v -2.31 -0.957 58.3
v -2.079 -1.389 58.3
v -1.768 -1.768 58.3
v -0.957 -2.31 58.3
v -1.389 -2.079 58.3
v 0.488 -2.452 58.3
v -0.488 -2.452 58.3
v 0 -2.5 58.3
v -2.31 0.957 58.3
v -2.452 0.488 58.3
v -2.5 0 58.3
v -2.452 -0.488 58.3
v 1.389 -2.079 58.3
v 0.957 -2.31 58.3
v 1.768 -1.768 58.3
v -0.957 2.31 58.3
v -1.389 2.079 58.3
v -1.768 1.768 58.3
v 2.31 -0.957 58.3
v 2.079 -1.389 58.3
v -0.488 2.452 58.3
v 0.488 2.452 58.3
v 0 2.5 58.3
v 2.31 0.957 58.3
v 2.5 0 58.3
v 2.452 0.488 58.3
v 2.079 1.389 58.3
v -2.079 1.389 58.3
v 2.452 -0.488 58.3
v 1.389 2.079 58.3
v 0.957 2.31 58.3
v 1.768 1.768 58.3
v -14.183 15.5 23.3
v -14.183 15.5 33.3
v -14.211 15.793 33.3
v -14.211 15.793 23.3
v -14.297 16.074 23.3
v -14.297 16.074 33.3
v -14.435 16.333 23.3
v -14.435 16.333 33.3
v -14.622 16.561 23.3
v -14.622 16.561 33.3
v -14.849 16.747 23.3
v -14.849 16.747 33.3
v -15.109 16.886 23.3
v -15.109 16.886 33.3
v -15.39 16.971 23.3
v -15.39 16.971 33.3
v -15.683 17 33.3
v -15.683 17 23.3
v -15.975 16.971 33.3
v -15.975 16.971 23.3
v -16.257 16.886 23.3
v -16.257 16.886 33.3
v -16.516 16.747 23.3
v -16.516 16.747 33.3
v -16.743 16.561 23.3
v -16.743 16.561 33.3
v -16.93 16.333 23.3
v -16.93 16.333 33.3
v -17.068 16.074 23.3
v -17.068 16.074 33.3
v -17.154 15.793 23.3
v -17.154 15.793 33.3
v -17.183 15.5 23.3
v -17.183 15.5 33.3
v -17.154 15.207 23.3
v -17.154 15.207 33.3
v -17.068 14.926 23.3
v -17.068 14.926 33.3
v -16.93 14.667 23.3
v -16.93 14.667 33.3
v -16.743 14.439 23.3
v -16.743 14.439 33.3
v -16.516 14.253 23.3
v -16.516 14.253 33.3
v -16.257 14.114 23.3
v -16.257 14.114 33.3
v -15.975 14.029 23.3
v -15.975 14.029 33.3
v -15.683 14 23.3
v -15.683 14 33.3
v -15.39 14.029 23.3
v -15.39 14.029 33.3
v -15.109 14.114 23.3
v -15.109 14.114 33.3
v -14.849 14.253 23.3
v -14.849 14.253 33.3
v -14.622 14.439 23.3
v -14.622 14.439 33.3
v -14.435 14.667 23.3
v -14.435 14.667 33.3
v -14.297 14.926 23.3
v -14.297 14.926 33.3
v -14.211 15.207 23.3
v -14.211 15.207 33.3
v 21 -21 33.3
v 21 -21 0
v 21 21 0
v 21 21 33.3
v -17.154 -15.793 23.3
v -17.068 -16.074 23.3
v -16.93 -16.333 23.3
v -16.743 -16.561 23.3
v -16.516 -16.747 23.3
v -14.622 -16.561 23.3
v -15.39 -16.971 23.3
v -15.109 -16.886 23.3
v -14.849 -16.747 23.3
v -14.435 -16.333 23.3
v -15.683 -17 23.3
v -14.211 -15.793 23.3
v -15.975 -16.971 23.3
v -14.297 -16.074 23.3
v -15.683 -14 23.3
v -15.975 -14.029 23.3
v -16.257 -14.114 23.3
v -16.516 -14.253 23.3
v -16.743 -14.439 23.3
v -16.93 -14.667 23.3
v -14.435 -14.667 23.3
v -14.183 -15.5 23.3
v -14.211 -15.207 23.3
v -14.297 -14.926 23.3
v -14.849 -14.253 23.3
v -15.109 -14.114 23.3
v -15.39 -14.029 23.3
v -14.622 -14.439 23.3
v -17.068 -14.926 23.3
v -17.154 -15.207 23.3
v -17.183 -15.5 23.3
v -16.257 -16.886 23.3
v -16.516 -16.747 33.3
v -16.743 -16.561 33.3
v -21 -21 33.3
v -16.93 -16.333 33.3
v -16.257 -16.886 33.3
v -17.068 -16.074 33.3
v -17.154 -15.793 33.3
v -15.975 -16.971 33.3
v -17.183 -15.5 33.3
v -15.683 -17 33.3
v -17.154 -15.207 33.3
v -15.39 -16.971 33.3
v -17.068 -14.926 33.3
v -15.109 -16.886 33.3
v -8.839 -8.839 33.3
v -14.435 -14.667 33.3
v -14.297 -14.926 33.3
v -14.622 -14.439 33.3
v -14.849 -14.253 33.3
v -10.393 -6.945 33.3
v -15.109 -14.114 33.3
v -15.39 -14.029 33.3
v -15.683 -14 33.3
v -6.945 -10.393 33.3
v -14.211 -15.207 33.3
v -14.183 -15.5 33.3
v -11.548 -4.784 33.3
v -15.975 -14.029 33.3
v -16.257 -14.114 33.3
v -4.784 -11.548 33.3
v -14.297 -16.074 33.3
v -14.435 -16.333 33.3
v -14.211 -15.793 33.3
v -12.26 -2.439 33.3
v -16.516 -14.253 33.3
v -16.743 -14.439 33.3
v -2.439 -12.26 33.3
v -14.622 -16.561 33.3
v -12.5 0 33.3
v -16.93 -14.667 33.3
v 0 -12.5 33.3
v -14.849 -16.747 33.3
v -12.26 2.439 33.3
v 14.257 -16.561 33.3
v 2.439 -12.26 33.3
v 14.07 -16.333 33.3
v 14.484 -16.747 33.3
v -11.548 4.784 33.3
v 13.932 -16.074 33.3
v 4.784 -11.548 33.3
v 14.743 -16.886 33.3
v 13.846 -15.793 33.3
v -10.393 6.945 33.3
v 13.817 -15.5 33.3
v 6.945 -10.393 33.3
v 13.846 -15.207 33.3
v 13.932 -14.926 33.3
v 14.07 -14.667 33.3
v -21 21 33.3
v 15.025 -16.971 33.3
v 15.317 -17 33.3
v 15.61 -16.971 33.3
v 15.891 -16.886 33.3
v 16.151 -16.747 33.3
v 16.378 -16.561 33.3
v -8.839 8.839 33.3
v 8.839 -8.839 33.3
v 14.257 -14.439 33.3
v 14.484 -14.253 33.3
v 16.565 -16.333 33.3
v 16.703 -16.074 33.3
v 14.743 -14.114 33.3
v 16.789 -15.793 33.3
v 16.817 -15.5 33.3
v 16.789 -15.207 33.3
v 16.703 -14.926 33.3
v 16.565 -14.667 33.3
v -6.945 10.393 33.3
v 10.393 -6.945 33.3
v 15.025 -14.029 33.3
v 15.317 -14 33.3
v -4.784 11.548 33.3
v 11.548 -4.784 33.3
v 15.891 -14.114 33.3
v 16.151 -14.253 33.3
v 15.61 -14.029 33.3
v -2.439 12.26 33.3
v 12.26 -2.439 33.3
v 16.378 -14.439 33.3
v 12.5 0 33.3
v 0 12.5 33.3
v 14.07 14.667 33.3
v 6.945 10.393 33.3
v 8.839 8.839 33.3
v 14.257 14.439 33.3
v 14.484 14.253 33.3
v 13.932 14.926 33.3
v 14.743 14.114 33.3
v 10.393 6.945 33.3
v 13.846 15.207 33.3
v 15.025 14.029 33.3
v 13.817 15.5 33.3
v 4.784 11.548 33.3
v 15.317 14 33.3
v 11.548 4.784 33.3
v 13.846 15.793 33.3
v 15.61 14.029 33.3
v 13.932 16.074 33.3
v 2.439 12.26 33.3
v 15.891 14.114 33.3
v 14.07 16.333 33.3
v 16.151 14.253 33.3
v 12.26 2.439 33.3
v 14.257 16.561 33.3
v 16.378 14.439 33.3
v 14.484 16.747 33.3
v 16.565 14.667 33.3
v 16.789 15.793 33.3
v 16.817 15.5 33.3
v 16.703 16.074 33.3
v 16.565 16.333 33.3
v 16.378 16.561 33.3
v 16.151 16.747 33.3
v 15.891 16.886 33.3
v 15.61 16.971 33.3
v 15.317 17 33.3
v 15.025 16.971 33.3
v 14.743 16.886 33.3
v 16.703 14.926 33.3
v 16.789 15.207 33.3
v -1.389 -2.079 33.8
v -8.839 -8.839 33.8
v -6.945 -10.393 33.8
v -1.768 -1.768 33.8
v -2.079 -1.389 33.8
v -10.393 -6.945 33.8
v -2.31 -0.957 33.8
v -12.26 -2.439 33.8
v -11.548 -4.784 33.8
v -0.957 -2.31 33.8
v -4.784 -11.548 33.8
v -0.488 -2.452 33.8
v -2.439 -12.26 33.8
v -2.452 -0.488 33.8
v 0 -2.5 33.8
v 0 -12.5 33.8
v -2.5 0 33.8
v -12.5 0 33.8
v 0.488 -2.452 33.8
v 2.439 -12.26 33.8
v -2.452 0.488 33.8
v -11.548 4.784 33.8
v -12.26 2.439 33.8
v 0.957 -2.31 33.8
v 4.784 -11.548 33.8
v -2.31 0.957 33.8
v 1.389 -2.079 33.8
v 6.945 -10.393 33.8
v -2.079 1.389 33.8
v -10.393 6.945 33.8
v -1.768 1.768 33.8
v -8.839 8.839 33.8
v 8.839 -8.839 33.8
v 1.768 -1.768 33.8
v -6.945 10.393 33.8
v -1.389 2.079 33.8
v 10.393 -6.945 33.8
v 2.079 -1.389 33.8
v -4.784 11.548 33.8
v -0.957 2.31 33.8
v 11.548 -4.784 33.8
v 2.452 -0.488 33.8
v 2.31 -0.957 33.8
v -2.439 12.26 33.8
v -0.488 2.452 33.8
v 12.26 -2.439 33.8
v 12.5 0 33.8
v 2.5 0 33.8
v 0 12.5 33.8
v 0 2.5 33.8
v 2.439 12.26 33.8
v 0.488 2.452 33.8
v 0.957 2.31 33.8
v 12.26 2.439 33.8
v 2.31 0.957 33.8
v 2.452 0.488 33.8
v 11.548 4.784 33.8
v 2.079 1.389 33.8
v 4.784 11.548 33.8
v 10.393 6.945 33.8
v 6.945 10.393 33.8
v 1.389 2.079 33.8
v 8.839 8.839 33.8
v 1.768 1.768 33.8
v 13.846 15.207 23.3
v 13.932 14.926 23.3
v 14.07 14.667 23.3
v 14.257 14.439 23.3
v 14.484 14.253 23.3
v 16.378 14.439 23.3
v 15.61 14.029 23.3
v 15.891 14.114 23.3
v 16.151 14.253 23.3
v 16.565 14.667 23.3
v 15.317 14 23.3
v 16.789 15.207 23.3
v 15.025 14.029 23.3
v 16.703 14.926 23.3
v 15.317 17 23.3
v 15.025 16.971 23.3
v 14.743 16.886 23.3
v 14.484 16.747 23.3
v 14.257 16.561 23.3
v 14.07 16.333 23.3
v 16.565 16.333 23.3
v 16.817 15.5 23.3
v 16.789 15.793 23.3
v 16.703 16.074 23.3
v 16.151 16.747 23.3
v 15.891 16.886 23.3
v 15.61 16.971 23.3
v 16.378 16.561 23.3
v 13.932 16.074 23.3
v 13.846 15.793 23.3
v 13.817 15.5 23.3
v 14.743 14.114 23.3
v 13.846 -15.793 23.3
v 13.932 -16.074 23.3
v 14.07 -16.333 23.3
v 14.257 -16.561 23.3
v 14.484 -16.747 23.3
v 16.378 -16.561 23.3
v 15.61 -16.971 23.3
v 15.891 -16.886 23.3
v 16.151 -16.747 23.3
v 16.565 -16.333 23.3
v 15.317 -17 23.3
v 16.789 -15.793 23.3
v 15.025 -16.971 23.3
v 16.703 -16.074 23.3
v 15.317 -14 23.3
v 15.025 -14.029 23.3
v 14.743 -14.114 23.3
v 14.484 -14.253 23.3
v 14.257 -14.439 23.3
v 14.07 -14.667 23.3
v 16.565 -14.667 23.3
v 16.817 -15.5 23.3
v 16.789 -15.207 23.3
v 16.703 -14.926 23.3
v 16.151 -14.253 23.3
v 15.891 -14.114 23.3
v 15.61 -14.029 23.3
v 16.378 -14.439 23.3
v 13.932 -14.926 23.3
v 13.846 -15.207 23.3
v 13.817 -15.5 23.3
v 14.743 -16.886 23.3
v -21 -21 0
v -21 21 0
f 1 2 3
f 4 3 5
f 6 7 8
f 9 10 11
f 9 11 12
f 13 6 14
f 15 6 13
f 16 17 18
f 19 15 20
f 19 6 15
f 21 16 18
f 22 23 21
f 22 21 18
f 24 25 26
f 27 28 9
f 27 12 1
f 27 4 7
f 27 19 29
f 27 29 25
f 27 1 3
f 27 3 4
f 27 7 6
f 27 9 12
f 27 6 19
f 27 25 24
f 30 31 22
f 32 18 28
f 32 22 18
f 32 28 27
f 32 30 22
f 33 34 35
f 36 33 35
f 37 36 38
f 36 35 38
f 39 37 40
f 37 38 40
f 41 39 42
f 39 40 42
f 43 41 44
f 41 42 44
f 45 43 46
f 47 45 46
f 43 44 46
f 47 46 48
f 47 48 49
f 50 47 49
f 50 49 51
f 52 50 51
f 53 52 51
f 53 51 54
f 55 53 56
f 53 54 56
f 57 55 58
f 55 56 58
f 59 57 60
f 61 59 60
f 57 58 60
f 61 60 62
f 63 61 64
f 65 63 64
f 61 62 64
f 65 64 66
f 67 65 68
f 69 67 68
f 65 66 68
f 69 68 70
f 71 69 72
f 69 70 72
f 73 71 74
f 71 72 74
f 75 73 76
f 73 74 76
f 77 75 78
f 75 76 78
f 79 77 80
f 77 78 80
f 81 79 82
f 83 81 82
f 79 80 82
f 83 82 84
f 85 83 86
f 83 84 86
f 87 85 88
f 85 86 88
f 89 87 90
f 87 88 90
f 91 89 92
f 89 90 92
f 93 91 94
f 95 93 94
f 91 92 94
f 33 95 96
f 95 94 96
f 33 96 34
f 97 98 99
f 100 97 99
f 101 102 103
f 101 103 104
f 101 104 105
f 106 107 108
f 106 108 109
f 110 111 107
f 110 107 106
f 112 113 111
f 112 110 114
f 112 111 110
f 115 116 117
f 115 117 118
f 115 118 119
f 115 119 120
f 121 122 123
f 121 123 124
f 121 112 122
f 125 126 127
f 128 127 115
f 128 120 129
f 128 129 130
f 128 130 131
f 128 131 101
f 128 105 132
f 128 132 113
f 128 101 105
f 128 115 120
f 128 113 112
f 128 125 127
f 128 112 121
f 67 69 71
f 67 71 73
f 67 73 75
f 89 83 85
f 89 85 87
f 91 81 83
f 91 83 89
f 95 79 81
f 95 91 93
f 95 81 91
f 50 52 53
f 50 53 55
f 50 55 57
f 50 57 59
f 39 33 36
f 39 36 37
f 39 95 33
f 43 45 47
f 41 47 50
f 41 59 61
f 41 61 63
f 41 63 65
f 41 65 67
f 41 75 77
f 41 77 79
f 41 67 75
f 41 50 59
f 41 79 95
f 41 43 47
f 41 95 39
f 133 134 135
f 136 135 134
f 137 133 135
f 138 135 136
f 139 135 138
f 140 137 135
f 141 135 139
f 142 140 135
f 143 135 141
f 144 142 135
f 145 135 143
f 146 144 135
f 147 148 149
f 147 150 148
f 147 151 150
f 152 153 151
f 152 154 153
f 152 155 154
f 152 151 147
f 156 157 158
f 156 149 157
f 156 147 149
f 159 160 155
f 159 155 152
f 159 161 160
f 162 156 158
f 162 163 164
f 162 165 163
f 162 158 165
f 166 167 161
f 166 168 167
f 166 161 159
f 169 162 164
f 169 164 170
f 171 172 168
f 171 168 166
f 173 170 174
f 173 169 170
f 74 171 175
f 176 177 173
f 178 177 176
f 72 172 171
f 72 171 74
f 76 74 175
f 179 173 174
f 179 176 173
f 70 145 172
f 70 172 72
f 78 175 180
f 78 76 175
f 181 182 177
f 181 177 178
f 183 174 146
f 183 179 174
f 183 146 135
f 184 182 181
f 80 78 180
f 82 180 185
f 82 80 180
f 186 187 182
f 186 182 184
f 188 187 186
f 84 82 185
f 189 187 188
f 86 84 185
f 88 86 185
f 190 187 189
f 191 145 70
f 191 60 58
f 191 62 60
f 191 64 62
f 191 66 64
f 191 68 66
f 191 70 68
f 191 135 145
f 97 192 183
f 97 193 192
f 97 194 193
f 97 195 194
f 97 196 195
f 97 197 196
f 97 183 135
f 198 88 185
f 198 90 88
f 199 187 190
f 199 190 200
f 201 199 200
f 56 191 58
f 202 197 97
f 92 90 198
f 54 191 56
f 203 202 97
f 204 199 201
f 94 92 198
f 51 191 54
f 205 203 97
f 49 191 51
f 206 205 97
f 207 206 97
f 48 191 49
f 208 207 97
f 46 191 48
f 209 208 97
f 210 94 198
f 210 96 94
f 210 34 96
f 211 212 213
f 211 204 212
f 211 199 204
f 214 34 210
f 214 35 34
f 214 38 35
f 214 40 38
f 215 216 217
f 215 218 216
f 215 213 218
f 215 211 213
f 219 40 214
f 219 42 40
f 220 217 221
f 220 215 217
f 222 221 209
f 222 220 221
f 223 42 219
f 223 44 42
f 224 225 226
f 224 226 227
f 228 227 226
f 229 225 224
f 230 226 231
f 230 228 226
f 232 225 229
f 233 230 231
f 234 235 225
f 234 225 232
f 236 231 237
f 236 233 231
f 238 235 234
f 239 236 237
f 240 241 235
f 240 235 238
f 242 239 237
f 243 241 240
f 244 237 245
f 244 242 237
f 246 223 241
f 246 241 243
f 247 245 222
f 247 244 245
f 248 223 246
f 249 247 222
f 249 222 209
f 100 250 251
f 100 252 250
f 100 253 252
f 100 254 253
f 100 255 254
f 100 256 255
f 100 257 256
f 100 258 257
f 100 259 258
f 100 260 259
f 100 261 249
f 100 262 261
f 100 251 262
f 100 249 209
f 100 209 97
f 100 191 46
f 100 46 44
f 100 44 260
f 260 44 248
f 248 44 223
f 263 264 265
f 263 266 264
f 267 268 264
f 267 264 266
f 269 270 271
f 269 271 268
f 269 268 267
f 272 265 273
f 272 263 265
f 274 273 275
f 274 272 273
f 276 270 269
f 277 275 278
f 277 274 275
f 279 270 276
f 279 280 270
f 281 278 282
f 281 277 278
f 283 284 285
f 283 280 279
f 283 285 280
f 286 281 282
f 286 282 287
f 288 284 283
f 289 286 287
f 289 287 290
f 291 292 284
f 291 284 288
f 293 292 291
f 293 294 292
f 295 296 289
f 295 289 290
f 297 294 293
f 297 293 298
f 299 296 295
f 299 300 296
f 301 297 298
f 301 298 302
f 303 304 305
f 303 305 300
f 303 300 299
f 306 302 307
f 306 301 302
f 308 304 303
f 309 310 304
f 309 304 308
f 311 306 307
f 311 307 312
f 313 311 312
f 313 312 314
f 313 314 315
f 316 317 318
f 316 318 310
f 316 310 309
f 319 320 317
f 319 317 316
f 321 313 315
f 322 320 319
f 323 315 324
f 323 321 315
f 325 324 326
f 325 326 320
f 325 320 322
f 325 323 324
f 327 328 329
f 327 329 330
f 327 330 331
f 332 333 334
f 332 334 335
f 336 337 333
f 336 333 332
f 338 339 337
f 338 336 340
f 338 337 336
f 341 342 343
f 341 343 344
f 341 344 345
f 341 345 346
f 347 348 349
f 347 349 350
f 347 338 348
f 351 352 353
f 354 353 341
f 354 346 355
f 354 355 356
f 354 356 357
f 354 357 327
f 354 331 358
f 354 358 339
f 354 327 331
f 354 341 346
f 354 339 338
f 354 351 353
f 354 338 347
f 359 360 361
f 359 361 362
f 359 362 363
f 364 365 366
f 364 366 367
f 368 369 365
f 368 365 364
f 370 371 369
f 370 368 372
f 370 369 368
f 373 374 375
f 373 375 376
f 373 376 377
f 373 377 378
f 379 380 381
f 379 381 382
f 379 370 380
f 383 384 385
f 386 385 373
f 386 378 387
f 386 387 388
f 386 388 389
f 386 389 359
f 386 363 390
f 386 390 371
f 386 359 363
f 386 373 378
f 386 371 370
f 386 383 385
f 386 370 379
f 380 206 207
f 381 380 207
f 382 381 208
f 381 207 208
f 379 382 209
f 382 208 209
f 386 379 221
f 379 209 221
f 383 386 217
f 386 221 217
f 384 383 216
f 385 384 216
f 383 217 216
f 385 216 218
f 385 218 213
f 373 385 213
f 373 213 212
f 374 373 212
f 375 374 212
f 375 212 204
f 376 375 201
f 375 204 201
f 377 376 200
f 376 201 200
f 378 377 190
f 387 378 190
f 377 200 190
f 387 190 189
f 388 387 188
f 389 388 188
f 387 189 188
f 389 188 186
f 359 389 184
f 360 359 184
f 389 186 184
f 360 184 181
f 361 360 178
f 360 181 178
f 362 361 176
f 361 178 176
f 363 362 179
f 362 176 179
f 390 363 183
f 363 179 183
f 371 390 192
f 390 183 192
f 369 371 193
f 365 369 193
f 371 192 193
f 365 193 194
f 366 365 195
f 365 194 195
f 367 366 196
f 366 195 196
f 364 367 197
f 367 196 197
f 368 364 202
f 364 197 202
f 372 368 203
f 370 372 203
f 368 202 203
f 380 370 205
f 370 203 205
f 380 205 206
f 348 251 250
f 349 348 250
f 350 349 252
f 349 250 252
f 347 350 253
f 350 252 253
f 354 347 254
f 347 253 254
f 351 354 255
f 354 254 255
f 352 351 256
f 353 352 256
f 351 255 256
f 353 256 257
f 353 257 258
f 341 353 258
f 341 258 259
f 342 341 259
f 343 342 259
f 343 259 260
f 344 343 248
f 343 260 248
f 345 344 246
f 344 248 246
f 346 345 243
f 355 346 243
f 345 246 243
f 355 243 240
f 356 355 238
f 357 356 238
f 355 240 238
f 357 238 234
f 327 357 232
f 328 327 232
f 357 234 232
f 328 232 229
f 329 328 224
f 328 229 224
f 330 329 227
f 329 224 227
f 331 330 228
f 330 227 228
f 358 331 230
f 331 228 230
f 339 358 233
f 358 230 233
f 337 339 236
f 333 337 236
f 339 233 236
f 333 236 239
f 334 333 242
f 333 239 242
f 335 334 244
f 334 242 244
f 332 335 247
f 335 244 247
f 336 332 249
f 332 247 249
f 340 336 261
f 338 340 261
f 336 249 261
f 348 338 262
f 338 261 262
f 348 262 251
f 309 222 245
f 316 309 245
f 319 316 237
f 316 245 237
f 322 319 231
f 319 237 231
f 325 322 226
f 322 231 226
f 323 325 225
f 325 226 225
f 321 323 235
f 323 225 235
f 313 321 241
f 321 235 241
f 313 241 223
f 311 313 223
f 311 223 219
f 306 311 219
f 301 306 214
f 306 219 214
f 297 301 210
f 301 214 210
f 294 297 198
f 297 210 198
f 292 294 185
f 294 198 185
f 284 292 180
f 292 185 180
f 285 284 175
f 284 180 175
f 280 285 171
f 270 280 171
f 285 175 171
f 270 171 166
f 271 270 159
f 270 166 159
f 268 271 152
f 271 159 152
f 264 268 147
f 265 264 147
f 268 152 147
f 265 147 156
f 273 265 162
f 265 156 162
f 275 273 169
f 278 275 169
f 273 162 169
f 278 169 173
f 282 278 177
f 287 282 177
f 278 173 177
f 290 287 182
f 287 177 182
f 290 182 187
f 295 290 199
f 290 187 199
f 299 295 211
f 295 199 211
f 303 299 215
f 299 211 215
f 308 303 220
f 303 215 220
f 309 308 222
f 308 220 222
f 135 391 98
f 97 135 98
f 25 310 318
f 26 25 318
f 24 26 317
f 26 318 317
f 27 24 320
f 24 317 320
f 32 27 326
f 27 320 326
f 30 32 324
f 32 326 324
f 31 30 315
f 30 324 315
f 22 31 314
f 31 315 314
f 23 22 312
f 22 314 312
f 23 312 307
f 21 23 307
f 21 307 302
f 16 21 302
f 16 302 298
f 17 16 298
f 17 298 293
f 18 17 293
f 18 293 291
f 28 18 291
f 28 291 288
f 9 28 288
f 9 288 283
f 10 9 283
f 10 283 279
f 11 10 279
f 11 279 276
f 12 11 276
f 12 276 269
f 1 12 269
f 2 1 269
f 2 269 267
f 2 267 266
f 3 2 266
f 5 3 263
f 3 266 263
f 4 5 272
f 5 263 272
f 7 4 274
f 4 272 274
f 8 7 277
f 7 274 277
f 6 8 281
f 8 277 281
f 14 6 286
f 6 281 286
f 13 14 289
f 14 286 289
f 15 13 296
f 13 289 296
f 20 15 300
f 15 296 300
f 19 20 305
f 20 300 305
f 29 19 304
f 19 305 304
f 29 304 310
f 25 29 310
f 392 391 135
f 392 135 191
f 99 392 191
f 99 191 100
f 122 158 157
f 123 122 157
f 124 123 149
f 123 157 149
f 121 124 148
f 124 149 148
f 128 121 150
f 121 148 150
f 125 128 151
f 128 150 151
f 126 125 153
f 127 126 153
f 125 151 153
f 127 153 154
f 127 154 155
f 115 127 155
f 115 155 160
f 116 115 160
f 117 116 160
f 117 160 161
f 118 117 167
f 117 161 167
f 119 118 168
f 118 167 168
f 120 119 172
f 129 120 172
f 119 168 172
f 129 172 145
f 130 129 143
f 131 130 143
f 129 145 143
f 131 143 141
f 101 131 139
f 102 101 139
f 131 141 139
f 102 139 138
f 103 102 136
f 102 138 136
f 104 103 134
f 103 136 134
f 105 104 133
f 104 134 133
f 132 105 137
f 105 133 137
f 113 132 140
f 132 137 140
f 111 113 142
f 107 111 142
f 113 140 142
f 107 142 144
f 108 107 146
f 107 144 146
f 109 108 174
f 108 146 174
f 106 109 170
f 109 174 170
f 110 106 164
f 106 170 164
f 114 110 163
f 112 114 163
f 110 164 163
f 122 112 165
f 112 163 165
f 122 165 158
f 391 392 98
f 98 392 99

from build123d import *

# Parameters (mm, degrees)
SKETCH_1_W          = 42
SKETCH_1_H          = 42
EXTRUDE_1_DEPTH     = 33.3
SKETCH_2_R          = 12.5
EXTRUDE_2_DEPTH     = 0.5
SKETCH_3_R          = 1.5
CUT_EXTRUDE_1_DEPTH = 10
SKETCH_5_R          = 2.5
EXTRUDE_3_DEPTH     = 25


with BuildPart() as part:
    # ｽｹｯﾁ1 → ﾎﾞｽ - 押し出し1 (new body)
    with BuildSketch(Plane.XY):
        Rectangle(SKETCH_1_W, SKETCH_1_H)
    extrude(amount=EXTRUDE_1_DEPTH)

    # ｽｹｯﾁ2 → ﾎﾞｽ - 押し出し2 (add)
    with BuildSketch(Plane.XY.offset(33.3)):
        Circle(SKETCH_2_R)
    extrude(amount=EXTRUDE_2_DEPTH)

    # ｽｹｯﾁ3 → ｶｯﾄ - 押し出し1 (cut)
    with BuildSketch(Plane.XY.offset(33.3)):
        with Locations((-15.682538541, 15.5)):
            Circle(SKETCH_3_R)
        with Locations((-15.682538541, -15.5)):
            Circle(SKETCH_3_R)
        with Locations((15.317461459, -15.5)):
            Circle(SKETCH_3_R)
        with Locations((15.317461459, 15.5)):
            Circle(SKETCH_3_R)
    extrude(amount=-CUT_EXTRUDE_1_DEPTH, mode=Mode.SUBTRACT)

    # ｽｹｯﾁ5 → ﾎﾞｽ - 押し出し3 (add)
    with BuildSketch(Plane.XY.offset(33.3)):
        Circle(SKETCH_5_R)
    extrude(amount=EXTRUDE_3_DEPTH)


solid = part.part
